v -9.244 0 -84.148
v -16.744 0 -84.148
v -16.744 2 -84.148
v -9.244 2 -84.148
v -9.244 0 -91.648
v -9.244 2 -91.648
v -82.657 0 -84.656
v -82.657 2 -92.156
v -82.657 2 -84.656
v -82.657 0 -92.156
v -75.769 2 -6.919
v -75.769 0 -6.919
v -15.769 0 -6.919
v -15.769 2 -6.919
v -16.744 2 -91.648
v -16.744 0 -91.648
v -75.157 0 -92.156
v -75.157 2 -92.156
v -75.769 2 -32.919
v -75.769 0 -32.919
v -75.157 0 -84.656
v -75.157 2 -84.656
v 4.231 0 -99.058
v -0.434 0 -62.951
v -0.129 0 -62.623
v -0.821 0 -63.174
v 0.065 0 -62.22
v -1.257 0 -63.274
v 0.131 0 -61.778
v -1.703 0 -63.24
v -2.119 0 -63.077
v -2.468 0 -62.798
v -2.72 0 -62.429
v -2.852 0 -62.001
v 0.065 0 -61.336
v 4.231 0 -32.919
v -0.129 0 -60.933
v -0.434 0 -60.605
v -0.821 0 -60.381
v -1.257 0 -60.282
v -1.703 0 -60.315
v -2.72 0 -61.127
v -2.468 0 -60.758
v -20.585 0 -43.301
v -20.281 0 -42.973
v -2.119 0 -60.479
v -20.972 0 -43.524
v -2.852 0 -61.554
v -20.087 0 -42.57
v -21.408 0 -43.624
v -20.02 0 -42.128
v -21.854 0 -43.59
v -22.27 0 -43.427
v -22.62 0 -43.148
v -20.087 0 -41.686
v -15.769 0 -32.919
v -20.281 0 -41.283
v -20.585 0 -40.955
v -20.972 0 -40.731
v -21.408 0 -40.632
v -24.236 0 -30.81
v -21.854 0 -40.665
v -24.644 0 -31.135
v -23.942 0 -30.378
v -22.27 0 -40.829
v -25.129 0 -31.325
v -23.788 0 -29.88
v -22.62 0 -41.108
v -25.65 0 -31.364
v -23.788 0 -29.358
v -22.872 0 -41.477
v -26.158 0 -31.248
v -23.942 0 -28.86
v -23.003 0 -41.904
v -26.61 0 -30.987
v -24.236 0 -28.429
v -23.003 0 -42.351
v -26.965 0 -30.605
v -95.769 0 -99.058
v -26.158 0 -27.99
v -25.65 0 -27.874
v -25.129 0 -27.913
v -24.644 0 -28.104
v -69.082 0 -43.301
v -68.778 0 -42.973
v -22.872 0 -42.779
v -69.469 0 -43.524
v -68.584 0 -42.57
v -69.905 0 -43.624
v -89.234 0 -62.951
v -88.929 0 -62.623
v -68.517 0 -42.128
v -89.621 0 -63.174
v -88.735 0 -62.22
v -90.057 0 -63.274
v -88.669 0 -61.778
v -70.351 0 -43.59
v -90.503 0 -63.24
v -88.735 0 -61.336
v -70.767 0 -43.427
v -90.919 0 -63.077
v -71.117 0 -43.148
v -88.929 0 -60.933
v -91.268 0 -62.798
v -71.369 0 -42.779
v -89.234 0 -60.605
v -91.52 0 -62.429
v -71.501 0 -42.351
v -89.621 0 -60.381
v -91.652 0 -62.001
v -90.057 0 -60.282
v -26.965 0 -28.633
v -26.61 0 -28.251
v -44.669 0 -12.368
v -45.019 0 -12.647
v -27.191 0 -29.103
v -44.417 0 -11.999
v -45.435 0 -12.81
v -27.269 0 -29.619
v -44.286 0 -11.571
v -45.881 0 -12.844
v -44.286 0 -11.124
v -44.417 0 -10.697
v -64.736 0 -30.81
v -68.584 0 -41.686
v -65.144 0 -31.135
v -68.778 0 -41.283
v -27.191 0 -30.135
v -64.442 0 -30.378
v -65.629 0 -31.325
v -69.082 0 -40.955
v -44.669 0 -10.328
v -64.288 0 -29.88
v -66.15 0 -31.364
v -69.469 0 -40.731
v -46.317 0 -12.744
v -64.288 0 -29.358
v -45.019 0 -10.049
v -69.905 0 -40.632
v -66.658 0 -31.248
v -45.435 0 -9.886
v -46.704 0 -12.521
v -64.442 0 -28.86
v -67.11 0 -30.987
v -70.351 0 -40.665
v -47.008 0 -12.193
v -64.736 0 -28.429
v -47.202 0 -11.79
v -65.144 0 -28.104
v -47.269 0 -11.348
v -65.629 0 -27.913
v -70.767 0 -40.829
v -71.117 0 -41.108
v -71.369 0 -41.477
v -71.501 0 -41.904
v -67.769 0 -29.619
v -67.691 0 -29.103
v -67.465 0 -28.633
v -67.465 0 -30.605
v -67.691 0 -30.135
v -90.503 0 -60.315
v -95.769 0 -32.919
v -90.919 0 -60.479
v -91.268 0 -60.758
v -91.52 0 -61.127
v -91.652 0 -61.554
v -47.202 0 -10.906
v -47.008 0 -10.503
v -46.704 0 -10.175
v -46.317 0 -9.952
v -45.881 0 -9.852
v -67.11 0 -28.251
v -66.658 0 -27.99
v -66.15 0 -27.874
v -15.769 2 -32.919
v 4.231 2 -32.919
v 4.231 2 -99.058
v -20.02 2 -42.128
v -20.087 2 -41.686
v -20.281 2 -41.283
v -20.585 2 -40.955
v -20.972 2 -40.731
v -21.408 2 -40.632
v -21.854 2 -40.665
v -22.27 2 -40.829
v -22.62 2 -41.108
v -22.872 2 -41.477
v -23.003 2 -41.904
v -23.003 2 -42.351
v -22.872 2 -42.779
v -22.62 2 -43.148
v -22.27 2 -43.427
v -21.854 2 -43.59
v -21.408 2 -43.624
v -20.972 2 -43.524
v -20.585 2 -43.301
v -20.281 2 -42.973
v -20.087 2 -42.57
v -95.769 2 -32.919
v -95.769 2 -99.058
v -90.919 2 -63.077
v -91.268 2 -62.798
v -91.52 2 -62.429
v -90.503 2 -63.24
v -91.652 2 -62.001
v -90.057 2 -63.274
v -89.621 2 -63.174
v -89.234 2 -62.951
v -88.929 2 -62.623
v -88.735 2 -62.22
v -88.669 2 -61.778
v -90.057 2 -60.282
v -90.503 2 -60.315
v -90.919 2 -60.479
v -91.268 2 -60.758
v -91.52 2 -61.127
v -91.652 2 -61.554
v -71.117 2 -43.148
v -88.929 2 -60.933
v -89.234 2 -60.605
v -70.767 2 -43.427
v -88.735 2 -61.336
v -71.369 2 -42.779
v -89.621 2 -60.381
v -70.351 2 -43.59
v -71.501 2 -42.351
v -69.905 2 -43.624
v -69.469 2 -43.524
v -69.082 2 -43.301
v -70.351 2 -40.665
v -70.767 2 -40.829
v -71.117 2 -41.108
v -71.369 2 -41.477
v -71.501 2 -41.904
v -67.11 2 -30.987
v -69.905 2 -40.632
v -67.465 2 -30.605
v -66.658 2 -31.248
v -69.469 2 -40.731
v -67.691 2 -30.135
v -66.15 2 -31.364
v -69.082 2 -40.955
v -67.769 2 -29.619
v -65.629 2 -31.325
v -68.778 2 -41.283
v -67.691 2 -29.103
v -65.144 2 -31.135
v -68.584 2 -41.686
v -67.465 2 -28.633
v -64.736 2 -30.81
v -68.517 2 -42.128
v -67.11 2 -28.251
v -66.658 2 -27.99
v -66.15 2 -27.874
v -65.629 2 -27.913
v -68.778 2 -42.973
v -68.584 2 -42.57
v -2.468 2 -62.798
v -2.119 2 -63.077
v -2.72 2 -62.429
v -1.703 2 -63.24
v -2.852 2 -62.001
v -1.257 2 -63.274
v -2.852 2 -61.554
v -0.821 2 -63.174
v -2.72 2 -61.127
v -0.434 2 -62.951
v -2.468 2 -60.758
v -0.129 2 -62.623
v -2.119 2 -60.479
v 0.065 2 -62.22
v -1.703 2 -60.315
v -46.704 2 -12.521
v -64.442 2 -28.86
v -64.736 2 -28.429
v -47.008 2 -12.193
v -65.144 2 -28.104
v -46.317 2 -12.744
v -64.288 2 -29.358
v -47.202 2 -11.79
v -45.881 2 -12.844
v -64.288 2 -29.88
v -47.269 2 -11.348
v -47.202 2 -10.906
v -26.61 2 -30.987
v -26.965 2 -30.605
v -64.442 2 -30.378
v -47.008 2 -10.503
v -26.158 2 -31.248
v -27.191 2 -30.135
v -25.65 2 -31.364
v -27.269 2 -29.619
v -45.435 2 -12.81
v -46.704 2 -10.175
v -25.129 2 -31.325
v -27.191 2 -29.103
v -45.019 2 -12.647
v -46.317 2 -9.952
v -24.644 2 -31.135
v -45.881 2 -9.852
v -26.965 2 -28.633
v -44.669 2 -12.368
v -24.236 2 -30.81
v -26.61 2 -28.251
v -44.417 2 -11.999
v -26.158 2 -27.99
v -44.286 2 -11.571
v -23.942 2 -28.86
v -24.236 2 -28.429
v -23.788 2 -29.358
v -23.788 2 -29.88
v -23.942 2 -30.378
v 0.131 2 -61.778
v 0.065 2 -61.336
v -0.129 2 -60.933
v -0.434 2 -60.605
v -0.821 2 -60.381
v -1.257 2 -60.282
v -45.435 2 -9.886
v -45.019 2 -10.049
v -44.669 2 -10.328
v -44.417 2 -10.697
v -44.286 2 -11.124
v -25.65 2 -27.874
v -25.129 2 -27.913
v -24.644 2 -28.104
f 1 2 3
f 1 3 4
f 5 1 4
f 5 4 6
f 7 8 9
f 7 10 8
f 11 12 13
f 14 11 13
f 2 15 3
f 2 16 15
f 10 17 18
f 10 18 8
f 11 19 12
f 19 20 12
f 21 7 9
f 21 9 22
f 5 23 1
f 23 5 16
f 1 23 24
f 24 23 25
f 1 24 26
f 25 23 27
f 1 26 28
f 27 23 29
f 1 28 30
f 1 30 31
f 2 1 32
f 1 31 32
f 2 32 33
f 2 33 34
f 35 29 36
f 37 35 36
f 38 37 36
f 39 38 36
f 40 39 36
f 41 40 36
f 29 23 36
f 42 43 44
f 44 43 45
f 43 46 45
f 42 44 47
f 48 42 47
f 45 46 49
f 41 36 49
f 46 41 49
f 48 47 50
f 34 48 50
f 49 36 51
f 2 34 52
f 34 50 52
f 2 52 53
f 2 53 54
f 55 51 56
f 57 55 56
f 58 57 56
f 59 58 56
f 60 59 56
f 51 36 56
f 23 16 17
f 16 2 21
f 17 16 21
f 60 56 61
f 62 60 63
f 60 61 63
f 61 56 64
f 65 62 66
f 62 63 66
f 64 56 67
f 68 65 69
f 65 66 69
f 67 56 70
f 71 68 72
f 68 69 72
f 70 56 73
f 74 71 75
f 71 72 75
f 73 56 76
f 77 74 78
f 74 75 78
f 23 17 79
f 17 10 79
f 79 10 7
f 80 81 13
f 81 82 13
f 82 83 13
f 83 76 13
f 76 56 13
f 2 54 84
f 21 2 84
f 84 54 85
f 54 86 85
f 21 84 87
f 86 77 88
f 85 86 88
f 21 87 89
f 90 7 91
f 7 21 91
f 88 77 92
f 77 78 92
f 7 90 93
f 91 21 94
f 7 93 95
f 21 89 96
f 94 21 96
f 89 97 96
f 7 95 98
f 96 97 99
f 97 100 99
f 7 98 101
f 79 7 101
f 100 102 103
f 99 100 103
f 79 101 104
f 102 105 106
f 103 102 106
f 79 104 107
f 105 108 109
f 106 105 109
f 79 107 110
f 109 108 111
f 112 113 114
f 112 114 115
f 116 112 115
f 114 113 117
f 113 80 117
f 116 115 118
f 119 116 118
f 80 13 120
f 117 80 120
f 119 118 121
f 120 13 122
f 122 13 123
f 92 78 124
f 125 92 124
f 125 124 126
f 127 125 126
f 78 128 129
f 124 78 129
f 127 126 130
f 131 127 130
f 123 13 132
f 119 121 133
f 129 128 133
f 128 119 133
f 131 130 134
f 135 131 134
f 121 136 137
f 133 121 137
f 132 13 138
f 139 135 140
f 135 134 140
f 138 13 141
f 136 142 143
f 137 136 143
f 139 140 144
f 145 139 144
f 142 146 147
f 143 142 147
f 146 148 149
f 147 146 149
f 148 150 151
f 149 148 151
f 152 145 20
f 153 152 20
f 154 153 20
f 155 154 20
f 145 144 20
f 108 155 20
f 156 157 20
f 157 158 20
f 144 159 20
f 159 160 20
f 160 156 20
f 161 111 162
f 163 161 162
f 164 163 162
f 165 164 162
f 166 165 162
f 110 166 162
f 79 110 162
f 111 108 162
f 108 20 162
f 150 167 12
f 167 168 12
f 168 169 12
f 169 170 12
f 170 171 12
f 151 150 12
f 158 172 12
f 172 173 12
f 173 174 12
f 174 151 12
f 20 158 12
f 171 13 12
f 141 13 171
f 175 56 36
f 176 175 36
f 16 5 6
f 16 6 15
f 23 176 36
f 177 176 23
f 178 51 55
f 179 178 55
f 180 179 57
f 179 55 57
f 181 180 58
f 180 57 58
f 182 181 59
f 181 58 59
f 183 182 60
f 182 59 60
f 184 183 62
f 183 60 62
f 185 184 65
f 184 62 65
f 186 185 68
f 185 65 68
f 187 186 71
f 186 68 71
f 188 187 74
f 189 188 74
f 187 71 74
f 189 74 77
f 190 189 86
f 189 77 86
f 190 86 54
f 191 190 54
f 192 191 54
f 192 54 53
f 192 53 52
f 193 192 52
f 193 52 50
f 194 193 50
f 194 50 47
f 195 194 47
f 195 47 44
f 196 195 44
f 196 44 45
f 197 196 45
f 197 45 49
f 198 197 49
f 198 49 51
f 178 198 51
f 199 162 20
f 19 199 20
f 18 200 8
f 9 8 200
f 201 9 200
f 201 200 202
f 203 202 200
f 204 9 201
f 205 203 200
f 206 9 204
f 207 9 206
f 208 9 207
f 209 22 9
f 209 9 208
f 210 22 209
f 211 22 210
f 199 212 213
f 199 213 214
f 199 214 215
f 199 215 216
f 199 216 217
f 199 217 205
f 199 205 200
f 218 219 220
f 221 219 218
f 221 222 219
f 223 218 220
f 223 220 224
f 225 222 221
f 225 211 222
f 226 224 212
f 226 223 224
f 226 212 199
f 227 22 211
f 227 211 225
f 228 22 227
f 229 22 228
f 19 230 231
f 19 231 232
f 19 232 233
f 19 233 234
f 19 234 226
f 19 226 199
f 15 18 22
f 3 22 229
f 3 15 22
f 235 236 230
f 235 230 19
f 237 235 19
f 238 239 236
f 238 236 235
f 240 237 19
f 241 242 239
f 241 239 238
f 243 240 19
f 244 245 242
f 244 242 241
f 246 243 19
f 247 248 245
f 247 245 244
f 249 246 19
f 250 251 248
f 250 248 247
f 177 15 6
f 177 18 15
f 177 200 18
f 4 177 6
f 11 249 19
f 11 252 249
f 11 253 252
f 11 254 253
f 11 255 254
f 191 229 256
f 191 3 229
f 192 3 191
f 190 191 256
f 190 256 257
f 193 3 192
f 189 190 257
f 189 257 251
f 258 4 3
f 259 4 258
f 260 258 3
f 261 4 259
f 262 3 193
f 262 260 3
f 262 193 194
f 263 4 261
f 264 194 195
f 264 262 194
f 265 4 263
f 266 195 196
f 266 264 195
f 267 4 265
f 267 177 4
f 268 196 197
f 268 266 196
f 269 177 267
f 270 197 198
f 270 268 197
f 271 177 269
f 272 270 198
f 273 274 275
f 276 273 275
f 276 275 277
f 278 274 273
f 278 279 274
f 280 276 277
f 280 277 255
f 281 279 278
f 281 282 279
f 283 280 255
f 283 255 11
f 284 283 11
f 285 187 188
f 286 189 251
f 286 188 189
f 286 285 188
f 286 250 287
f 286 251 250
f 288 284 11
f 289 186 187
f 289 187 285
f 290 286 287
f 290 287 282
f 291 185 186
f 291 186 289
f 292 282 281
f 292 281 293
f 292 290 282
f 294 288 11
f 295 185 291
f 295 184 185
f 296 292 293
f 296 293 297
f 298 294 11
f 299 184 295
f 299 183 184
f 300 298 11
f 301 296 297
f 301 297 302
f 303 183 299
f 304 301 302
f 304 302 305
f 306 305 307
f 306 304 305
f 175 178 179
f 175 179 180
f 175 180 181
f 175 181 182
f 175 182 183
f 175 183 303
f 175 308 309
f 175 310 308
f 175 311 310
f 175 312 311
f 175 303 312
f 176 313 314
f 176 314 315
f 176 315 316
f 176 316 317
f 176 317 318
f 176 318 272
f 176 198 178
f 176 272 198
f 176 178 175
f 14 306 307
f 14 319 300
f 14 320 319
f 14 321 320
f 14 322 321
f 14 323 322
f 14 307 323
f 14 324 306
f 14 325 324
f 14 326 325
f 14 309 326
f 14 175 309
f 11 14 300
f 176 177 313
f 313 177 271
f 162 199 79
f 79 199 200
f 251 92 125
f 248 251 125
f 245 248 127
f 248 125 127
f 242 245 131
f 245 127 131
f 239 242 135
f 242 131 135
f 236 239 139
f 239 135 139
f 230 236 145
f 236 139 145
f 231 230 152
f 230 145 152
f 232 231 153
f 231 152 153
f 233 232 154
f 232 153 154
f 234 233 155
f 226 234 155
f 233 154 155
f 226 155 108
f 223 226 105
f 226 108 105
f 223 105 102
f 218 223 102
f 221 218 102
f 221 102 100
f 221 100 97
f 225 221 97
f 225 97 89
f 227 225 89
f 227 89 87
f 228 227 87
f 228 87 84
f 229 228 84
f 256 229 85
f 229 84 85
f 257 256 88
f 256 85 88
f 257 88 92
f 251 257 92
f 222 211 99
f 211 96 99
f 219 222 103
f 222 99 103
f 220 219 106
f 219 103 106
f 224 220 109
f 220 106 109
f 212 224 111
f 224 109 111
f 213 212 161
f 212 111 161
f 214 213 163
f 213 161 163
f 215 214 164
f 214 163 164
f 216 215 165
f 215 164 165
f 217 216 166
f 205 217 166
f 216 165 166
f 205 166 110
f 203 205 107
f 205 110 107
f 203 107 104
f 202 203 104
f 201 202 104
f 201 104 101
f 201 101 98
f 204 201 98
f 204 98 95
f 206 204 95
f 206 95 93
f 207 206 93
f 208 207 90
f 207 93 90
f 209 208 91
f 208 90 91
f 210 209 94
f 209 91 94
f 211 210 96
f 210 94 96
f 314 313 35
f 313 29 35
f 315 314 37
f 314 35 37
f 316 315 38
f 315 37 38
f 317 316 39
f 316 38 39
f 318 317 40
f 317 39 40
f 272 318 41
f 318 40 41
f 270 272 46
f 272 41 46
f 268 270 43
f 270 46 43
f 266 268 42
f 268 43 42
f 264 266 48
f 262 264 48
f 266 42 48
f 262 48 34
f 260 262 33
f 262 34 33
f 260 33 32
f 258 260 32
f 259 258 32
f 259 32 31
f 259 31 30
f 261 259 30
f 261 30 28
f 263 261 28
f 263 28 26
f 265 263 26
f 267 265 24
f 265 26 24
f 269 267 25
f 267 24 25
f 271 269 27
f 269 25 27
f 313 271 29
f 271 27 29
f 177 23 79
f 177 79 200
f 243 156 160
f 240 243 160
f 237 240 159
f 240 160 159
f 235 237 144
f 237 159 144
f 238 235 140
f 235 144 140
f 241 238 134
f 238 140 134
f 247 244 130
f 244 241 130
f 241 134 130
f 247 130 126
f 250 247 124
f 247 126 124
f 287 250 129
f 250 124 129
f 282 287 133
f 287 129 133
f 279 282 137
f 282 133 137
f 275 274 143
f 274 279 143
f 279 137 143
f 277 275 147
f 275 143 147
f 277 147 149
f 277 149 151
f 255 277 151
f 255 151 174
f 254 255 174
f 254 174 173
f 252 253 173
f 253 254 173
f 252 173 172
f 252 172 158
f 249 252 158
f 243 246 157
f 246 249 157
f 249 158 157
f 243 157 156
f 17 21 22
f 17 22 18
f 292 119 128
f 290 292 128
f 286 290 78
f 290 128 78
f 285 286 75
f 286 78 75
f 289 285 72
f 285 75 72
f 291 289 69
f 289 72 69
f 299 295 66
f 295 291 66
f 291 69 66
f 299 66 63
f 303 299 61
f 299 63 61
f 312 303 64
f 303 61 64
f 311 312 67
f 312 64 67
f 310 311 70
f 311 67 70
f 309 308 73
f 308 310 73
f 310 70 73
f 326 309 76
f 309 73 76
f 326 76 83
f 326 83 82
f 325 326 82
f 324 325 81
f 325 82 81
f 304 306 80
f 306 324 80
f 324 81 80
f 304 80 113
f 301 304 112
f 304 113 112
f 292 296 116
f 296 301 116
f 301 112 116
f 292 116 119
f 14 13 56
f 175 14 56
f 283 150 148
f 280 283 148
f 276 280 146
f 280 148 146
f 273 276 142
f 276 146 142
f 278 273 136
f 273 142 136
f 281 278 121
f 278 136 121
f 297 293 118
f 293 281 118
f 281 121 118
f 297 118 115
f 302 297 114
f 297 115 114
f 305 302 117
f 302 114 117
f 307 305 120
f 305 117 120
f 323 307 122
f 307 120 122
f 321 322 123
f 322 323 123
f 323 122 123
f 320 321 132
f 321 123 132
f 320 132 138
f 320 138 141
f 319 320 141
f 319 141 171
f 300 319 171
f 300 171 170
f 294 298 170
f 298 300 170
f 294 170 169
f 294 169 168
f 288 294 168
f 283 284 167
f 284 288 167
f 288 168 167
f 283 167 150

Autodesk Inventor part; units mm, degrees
ref_plane "YZ Plane" through (0, 0, 0) normal (1, 0, 0) x (0, 1, 0)
ref_plane "XZ Plane" through (0, 0, 0) normal (0, 1, 0) x (-1, 0, 0)
ref_plane "XY Plane" through (0, 0, 0) normal (0, 0, 1) x (1, 0, 0)
sketch "Szkic1" plane through (0, 0, 0) normal (0, 1, 0) x (-1, 0, 0)
  circle A0 centre (45.7688, -11.3479) radius 1.5
  circle A1 centre (25.5188, -29.6192) radius 1.75
  circle A2 centre (66.0188, -29.6192) radius 1.75
  line L0 (-4.2312, -99.4192) -> (95.7688, -99.4192)
  line L1 (95.7688, -99.4192) -> (95.7688, -32.9192)
  line L2 (95.7688, -32.9192) -> (75.7688, -32.9192)
  line L3 (75.7688, -32.9192) -> (75.7688, -6.9192)
  line L4 (75.7688, -6.9192) -> (15.7688, -6.9192)
  line L5 (15.7688, -6.9192) -> (15.7688, -32.9192)
  line L6 (15.7688, -32.9192) -> (-4.2312, -32.9192)
  line L7 (-4.2312, -32.9192) -> (-4.2312, -99.4192)
  point P0 (0, 0)
  point P1 (0, 0)
extrude "Wyciągnięcie proste1" add sketch "Szkic1" along normal blind 2
sketch "Szkic2" plane through (0, 0, 0) normal (0, -1, 0) x (1, 0, 0)
  circle A0 centre (-1.3688, -61.7778) radius 1.5 projected
  circle A1 centre (-21.5202, -42.1278) radius 1.5 projected
  circle A2 centre (-70.0174, -42.1278) radius 1.5 projected
  circle A3 centre (-90.1688, -61.7778) radius 1.5 projected
  point P0 (0, 0)
extrude "Wyciągnięcie proste2" cut sketch "Szkic2" against normal blind 2
sketch "Szkic3" plane through (4.2312, 0, -32.9192) normal (1, 0, 0) x (0, 0, -1)
  line L0 (0, 0) -> (66.5, 0) projected
  line L1 (66.5, 0) -> (66.5, 2) projected
  line L2 (0, 2) -> (66.5, 2) projected
  line L3 (0, 0) -> (0, 2) projected
  line L4 (46.3508, 37) -> (66.9119, -1.4451) projected
  point P0 (-32.9192, 0)
  point P1 (65.0694, 2)
  point P2 (66.1391, 0)
extrude "Wyciągnięcie proste3" cut sketch "Szkic3" against normal through all contours L4 L2 L1 L0
sketch "Szkic4" plane through (0, 0, 0) normal (0, -1, 0) x (1, 0, 0)
  circle A0 centre (-11.7244, -89.168) radius 0.3048 projected
  circle A1 centre (-14.2644, -89.168) radius 0.3048 projected
  circle A2 centre (-14.2644, -86.628) radius 0.3048 projected
  circle A3 centre (-11.7244, -86.628) radius 0.3048 projected
  circle A4 centre (-80.1774, -89.676) radius 0.3048 projected
  circle A5 centre (-77.6374, -89.676) radius 0.3048 projected
  circle A6 centre (-77.6374, -87.136) radius 0.3048 projected
  circle A7 centre (-80.1774, -87.136) radius 0.3048 projected
  line L0 (-11.7244, -86.628) -> (-14.2644, -86.628)
  line L1 (-14.2644, -86.628) -> (-14.2644, -89.168)
  line L2 (-14.2644, -89.168) -> (-11.7244, -89.168)
  line L3 (-11.7244, -89.168) -> (-11.7244, -86.628)
  line L4 (-77.6374, -87.136) -> (-80.1774, -87.136)
  line L5 (-80.1774, -87.136) -> (-80.1774, -89.676)
  line L6 (-80.1774, -89.676) -> (-77.6374, -89.676)
  line L7 (-77.6374, -89.676) -> (-77.6374, -87.136)
  circle A8 centre (-78.9074, -88.406) radius 3.75
  circle A9 centre (-12.9944, -87.898) radius 3.75
  line L8 (-16.7444, -84.148) -> (-9.2444, -84.148)
  line L9 (-9.2444, -84.148) -> (-9.2444, -91.648)
  line L10 (-9.2444, -91.648) -> (-16.7444, -91.648)
  line L11 (-16.7444, -91.648) -> (-16.7444, -84.148)
  line L12 (-82.6574, -84.656) -> (-75.1574, -84.656)
  line L13 (-75.1574, -84.656) -> (-75.1574, -92.156)
  line L14 (-75.1574, -92.156) -> (-82.6574, -92.156)
  line L15 (-82.6574, -92.156) -> (-82.6574, -84.656)
  point P0 (0, 0)
  dimension "d6" = 7.5
  dimension "d7" = 7.5
extrude "Wyciągnięcie proste4" cut sketch "Szkic4" against normal through all contours A0 L2 L3 | L3 L2 A0 | A0 L2 A1 L1 A2 L0 A3 L3 | L3 L0 A3 | A3 L0 L3 | L2 L1 A1 | A1 L1 L2 | L0 L1 A2 | A2 L1 L0 | L6 L5 A4 | A4 L5 L6 | A4 L5 A7 L4 A6 L7 A5 L6 | L6 L7 A5 | A5 L7 L6 | L5 L4 A7 | A7 L4 L5 | L7 L4 A6 | A6 L4 L7 | A8 | L13 L14 A8 | A8 L12 L13 | A8 L15 L12 | L14 L15 A8 | A9 | L9 L10 A9 | A9 L8 L9 | A9 L11 L8 | L10 L11 A9
sketch "Szkic6" plane through (4.2312, 2, -32.9192) normal (1, 0, 0) x (0, 0, -1)
  line L0 (66.1391, -2) -> (65.0694, 0) projected
  line L1 (0, 0) -> (65.0694, 0) projected
  line L2 (0, -2) -> (0, 0) projected
  line L3 (66.1391, 0) -> (65, 0)
  line L4 (65, 0) -> (65, -3)
  line L5 (65, -3) -> (66.1391, -3)
  line L6 (66.1391, -3) -> (66.1391, 0)
  line L7 (0, -2) -> (66.1391, -2) projected
  point P0 (-32.9192, -2)
extrude "Wyciągnięcie proste6" add sketch "Szkic6" against normal blind 100 contours L0 L3 L6
properties part number "podstawa" material "Stal, węglowa"
